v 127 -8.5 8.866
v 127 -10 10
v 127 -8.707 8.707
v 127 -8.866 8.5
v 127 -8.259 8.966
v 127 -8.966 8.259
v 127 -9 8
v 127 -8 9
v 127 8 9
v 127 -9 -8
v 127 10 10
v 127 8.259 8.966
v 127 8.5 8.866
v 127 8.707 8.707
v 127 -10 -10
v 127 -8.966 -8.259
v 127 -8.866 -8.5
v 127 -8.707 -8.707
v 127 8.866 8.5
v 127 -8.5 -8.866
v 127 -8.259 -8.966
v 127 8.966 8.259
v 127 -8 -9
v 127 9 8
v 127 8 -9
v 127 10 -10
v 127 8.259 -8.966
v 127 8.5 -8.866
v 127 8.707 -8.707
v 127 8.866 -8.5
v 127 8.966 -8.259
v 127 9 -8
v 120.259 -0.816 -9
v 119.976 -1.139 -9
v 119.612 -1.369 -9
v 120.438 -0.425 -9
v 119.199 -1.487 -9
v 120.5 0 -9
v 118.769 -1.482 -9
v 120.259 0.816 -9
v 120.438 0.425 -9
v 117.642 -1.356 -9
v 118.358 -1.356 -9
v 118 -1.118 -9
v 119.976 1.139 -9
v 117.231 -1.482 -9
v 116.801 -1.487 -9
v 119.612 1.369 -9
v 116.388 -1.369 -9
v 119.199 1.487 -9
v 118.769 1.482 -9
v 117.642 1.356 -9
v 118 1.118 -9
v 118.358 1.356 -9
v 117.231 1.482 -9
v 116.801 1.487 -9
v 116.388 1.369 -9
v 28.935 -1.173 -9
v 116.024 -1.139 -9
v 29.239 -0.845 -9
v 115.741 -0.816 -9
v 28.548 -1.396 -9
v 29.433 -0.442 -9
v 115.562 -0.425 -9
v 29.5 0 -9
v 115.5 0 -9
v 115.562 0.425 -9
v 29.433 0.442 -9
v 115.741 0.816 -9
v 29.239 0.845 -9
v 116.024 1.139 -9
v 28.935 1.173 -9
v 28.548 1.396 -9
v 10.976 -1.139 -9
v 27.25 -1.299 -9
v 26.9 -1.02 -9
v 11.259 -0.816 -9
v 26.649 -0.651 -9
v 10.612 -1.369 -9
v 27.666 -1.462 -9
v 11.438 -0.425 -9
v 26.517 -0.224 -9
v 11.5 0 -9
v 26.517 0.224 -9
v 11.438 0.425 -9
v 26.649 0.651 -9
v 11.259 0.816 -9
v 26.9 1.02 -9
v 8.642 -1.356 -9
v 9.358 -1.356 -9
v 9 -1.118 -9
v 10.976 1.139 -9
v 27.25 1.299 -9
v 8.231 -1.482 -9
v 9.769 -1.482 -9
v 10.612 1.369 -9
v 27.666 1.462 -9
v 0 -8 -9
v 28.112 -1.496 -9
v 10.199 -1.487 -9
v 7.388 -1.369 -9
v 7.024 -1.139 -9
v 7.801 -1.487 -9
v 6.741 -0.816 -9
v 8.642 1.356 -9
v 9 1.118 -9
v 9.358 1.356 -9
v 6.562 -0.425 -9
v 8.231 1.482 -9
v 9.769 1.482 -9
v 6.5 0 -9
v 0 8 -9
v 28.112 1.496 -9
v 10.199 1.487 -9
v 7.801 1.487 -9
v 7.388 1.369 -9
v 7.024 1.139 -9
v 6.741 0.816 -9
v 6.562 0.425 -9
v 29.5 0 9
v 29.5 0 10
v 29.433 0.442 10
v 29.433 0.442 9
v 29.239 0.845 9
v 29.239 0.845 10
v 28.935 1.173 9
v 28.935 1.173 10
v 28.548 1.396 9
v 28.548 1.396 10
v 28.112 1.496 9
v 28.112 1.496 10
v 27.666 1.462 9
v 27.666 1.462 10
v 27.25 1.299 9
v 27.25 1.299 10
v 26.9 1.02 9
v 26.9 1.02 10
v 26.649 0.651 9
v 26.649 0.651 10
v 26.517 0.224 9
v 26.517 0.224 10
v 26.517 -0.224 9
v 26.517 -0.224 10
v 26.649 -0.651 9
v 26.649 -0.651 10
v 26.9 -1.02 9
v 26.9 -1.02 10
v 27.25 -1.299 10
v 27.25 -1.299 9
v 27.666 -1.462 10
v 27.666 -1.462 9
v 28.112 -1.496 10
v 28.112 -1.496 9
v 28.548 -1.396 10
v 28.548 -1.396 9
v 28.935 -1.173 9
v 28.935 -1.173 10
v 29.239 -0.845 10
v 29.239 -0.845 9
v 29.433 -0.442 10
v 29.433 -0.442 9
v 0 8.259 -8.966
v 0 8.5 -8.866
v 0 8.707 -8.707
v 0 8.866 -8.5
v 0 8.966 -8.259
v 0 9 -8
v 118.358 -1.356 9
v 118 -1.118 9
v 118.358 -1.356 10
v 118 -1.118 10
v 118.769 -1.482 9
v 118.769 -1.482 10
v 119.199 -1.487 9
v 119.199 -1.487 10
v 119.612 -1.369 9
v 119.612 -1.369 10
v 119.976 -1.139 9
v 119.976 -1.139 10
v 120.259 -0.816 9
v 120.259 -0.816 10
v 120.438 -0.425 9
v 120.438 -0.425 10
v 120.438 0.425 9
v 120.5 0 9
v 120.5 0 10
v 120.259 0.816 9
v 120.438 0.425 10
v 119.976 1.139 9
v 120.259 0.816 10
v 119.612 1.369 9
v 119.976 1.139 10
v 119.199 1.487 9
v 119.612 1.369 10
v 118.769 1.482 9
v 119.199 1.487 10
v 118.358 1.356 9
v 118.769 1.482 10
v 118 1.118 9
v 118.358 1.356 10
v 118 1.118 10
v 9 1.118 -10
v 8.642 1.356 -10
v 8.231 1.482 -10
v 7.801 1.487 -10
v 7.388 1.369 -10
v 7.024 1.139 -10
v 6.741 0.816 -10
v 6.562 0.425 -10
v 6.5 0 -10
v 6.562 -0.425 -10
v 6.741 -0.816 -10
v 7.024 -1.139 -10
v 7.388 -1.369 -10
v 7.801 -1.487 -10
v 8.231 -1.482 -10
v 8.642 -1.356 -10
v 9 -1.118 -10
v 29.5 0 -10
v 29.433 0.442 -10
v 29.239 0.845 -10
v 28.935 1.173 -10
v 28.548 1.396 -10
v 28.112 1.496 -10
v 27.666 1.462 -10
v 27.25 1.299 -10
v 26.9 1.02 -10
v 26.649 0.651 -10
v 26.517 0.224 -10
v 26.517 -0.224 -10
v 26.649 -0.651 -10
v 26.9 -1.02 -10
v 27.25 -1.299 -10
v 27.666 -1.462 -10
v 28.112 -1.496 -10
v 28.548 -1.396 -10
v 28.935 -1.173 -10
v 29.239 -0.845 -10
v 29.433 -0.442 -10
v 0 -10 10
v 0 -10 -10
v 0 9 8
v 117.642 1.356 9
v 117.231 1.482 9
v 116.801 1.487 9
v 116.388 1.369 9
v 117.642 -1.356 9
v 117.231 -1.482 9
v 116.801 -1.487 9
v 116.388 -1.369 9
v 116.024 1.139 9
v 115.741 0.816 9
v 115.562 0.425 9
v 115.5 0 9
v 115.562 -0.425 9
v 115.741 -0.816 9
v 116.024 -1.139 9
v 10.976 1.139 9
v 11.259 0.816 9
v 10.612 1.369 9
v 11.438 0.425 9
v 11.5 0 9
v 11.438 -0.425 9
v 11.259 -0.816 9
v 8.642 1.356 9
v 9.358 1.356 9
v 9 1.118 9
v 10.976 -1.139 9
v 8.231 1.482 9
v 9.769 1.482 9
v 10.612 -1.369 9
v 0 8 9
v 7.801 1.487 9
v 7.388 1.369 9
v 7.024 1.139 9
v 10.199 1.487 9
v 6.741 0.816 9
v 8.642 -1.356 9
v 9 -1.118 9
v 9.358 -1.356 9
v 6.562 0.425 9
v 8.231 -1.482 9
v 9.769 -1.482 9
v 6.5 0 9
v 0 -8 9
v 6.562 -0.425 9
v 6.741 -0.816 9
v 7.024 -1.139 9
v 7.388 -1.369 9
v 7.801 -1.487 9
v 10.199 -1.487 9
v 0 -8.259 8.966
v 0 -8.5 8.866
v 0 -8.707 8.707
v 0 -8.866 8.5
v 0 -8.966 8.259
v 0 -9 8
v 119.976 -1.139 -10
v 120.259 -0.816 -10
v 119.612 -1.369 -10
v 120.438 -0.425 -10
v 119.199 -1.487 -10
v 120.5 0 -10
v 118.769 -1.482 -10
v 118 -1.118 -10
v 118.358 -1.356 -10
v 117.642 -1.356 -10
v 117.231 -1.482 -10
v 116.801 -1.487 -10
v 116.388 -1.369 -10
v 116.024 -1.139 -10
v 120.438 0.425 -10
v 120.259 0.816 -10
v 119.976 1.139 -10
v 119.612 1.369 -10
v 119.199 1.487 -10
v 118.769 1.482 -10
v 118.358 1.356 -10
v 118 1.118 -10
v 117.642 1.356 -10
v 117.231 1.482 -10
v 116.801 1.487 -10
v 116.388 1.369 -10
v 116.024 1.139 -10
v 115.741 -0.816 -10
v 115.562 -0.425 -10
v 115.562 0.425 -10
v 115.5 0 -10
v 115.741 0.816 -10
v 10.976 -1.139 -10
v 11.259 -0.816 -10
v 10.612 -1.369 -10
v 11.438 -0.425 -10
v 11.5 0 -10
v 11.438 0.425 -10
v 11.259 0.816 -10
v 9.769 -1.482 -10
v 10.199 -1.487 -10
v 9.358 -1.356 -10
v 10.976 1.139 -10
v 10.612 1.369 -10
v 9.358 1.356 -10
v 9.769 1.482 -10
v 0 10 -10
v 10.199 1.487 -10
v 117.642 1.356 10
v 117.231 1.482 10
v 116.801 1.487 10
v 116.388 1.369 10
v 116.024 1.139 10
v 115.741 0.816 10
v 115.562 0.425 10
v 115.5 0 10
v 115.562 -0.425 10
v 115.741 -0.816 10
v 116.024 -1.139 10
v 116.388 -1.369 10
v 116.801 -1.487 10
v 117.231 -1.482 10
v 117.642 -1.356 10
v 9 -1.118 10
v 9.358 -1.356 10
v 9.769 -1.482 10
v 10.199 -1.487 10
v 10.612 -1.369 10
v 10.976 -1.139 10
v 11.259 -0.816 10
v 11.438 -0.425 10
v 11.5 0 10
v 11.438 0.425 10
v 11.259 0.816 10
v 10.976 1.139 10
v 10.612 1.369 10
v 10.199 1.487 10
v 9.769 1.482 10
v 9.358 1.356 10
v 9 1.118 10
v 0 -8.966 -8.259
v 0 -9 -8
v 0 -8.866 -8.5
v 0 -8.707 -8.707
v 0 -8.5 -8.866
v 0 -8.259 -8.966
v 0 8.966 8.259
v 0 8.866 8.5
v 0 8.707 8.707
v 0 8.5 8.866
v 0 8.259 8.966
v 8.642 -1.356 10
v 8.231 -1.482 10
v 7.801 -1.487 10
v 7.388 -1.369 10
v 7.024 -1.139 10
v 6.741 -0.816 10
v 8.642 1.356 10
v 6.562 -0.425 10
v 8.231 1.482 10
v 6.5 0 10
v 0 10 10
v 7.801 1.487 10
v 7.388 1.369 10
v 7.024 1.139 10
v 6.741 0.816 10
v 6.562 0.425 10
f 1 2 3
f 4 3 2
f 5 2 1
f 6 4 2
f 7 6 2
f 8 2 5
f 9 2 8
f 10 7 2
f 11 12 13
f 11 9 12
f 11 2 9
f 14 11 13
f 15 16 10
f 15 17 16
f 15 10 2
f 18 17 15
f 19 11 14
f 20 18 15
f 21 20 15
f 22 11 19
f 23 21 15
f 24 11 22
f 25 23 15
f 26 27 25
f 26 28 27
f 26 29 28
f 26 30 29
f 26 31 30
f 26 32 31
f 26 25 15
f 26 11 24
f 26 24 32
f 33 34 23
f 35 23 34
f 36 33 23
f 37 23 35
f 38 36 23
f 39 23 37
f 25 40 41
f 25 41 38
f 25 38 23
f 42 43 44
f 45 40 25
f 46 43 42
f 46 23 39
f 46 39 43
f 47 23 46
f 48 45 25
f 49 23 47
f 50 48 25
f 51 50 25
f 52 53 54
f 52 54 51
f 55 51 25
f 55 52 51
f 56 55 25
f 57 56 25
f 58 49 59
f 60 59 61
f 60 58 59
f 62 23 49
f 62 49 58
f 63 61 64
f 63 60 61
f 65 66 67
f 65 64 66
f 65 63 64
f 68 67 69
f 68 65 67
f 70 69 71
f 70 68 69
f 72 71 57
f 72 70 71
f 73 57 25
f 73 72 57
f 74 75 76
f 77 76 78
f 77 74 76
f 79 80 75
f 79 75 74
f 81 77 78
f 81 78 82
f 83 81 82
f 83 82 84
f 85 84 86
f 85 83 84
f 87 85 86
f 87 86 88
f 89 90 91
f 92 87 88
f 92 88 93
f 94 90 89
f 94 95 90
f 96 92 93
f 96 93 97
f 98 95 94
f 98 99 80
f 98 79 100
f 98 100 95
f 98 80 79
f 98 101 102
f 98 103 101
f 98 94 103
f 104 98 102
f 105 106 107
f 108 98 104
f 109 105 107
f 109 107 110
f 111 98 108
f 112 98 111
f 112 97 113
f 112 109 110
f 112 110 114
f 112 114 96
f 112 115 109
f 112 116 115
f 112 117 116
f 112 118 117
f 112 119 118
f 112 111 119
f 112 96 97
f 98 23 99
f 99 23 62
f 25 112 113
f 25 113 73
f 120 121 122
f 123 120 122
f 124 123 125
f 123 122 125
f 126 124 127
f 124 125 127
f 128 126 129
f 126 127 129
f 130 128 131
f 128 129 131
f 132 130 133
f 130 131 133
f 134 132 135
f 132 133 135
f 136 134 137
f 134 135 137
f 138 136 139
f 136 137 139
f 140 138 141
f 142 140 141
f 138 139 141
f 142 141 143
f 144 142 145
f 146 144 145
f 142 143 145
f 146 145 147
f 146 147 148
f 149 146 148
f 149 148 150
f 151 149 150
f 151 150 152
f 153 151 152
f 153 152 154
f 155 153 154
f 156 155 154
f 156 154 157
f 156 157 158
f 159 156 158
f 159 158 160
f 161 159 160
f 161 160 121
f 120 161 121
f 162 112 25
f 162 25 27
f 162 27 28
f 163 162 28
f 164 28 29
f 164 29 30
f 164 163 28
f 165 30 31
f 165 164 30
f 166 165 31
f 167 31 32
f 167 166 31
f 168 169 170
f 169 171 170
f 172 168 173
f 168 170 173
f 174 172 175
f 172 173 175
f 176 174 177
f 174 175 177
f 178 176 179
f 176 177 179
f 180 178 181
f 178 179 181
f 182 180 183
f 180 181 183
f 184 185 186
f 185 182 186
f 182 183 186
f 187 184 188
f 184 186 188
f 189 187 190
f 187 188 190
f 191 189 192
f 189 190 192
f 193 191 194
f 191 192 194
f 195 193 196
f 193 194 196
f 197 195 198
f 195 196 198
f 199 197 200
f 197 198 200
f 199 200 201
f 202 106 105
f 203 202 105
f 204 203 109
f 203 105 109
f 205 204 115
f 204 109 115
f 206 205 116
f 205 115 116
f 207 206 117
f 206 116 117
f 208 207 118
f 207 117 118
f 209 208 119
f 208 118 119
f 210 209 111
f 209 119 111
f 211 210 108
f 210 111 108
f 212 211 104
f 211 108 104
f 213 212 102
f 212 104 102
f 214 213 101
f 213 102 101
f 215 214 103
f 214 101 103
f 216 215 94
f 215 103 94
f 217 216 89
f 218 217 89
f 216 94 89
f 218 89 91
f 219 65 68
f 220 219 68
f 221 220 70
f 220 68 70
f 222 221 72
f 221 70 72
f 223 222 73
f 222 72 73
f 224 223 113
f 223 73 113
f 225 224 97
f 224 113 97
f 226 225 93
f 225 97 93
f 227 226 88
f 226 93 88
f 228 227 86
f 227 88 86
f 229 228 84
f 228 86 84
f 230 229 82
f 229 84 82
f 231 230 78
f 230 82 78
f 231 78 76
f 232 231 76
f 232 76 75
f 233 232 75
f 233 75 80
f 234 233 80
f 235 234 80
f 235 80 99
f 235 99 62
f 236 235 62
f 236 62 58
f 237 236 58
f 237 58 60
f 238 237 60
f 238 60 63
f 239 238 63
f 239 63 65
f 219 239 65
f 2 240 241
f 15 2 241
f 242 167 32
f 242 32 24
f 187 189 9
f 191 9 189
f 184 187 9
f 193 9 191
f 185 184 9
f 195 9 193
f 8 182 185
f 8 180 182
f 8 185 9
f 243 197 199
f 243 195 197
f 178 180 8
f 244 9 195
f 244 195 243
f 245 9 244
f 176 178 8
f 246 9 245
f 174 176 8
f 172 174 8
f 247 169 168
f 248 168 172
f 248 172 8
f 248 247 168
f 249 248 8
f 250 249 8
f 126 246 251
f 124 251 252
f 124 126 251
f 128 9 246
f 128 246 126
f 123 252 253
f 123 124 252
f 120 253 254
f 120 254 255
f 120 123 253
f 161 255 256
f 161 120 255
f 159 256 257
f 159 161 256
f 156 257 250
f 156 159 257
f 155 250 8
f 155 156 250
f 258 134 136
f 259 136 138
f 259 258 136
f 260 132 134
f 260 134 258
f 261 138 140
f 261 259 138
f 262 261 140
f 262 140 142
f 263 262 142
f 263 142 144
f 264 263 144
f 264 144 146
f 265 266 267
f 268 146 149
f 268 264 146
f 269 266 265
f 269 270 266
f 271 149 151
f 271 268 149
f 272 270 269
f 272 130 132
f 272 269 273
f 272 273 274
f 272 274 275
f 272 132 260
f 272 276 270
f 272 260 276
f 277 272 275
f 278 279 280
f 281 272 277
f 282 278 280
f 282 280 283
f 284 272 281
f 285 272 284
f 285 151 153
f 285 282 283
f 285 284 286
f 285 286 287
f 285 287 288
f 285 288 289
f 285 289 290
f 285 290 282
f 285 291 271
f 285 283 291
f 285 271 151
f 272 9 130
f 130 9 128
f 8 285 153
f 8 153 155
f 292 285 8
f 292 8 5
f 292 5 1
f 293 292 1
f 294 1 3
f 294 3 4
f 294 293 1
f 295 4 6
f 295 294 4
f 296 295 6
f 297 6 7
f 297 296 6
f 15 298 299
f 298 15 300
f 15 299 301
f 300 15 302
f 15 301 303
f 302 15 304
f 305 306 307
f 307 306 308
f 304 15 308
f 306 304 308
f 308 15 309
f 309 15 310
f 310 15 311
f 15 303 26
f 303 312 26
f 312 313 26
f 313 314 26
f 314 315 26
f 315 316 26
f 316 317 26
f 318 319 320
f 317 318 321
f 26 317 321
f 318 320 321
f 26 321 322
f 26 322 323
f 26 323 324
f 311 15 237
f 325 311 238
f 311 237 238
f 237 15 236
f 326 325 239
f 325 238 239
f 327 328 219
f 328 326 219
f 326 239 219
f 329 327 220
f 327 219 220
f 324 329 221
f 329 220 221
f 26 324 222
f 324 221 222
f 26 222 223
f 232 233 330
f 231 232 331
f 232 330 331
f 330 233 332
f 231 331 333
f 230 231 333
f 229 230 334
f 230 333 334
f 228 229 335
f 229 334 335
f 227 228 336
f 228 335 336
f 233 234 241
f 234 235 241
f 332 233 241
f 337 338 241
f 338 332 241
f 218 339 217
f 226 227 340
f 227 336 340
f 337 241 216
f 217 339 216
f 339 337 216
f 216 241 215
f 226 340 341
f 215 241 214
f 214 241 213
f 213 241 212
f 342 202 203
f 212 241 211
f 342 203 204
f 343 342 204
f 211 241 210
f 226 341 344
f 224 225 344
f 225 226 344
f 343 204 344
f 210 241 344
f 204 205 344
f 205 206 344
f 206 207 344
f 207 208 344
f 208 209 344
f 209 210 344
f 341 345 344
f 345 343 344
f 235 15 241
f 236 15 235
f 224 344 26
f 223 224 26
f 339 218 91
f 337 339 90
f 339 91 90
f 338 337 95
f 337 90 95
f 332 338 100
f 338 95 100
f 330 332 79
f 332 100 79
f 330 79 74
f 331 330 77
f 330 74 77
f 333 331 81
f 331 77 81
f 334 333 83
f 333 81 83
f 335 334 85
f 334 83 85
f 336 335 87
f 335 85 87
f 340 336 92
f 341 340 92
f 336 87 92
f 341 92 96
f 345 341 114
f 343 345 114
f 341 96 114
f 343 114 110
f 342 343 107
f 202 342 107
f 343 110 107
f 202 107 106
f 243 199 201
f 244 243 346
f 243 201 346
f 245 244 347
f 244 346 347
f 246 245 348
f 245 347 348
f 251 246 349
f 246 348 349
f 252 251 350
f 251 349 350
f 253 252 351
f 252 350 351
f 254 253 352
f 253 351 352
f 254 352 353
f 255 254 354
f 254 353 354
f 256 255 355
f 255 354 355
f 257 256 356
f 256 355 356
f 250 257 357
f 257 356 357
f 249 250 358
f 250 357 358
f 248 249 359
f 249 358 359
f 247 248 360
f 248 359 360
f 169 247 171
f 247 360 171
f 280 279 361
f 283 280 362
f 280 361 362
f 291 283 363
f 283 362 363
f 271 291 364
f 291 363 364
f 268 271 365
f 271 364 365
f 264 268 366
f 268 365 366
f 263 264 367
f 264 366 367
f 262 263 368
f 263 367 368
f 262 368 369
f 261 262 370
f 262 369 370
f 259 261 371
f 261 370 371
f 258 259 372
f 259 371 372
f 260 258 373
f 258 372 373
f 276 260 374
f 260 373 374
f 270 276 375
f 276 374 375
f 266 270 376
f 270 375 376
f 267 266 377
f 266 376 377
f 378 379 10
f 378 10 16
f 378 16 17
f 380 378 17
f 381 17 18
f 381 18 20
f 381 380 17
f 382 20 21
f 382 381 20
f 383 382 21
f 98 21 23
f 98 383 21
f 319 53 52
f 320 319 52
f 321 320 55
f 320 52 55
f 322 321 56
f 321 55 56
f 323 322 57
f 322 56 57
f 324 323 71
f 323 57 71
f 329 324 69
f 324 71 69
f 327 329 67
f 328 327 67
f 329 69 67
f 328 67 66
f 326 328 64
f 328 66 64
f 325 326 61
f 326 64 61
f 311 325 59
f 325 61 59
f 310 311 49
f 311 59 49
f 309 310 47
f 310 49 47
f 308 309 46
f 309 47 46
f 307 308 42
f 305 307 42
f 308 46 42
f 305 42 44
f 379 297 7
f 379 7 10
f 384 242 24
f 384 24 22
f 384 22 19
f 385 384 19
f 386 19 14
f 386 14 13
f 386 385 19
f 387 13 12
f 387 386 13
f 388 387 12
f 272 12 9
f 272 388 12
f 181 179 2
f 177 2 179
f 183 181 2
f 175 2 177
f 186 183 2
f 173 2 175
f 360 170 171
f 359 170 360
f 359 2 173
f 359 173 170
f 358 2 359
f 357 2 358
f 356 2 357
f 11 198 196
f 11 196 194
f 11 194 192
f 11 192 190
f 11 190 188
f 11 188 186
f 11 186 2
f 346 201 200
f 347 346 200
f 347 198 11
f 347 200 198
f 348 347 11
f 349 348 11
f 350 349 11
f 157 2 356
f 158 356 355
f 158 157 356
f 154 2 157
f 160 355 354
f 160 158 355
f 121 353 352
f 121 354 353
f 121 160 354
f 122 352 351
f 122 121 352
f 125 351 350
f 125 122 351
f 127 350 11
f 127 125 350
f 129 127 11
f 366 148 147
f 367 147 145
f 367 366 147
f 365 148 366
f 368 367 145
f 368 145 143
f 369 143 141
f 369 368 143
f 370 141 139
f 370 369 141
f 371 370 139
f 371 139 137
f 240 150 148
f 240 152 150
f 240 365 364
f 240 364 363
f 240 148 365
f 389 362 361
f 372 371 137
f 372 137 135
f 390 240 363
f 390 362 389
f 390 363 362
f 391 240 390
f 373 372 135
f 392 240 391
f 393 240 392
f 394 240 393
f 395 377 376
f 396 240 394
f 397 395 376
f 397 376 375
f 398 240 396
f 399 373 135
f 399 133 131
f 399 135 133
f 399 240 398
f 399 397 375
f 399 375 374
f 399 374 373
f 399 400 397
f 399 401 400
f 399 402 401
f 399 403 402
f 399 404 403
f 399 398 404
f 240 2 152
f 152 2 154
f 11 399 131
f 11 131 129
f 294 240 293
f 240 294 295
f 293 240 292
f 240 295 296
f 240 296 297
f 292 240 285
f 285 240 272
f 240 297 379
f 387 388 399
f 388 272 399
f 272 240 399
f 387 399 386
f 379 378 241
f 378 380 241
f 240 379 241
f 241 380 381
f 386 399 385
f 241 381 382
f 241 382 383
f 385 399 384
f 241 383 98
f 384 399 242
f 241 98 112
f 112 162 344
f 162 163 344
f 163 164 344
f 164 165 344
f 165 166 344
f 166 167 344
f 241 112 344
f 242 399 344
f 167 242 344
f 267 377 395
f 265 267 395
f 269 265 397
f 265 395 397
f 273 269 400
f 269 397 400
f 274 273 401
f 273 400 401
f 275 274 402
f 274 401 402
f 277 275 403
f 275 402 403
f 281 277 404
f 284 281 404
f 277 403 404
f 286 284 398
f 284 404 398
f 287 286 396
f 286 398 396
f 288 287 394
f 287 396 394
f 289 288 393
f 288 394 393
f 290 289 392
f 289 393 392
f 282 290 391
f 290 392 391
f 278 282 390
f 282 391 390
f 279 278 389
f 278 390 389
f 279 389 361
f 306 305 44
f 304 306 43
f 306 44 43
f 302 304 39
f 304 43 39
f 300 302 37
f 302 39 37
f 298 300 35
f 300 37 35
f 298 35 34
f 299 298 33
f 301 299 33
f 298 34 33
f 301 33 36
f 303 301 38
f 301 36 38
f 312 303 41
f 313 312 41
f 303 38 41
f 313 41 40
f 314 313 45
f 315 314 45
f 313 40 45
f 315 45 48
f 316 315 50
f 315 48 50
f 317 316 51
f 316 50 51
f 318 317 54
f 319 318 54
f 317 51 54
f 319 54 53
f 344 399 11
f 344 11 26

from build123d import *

# Parameters (mm, degrees)
SKETCH1_W           = 20
SKETCH1_H           = 20
BOSS_EXTRUDE1_DEPTH = 127
SKETCH5_R           = 1.5
CUT_EXTRUDE4_DEPTH  = 20
SKETCH2_R           = 1.5
CUT_EXTRUDE1_DEPTH  = 600
SKETCH3_R           = 1.5
CUT_EXTRUDE2_DEPTH  = 30


with BuildPart() as part:
    # Sketch1 → Boss-Extrude1 (new body)
    with BuildSketch(Plane(origin=(0, 0, 0), x_dir=(0, 0, -1), z_dir=(1, 0, 0))):
        Rectangle(SKETCH1_W, SKETCH1_H)
        with BuildLine():
            Line((-8, -9), (8, -9))
            ThreePointArc((8, -9), (8.707106781, -8.707106781), (9, -8))
            Line((9, -8), (9, 8))
            ThreePointArc((9, 8), (8.707106781, 8.707106781), (8, 9))
            Line((8, 9), (-8, 9))
            ThreePointArc((-8, 9), (-8.707106781, 8.707106781), (-9, 8))
            Line((-9, 8), (-9, -8))
            ThreePointArc((-9, -8), (-8.707106781, -8.707106781), (-8, -9))
        make_face(mode=Mode.SUBTRACT)
    extrude(amount=BOSS_EXTRUDE1_DEPTH)

    # Sketch5 → Cut-Extrude4 (cut)
    with BuildSketch(Plane.XY.offset(10)):
        with Locations((10, 0)):
            Circle(SKETCH5_R)
        with Locations((117, 0)):
            Circle(SKETCH5_R)
    extrude(amount=-CUT_EXTRUDE4_DEPTH, mode=Mode.SUBTRACT)

    # Sketch2 → Cut-Extrude1 (cut)
    with BuildSketch(Plane.XY.offset(10)):
        with Locations((8, 0)):
            Circle(SKETCH2_R)
        with Locations((28, 0)):
            Circle(SKETCH2_R)
    extrude(amount=-CUT_EXTRUDE1_DEPTH, mode=Mode.SUBTRACT)

    # Sketch3 → Cut-Extrude2 (cut)
    with BuildSketch(Plane.XY.offset(10)):
        with Locations((119, 0)):
            Circle(SKETCH3_R)
        with Locations((139, 0)):
            Circle(SKETCH3_R)
    extrude(amount=-CUT_EXTRUDE2_DEPTH, mode=Mode.SUBTRACT)


solid = part.part
